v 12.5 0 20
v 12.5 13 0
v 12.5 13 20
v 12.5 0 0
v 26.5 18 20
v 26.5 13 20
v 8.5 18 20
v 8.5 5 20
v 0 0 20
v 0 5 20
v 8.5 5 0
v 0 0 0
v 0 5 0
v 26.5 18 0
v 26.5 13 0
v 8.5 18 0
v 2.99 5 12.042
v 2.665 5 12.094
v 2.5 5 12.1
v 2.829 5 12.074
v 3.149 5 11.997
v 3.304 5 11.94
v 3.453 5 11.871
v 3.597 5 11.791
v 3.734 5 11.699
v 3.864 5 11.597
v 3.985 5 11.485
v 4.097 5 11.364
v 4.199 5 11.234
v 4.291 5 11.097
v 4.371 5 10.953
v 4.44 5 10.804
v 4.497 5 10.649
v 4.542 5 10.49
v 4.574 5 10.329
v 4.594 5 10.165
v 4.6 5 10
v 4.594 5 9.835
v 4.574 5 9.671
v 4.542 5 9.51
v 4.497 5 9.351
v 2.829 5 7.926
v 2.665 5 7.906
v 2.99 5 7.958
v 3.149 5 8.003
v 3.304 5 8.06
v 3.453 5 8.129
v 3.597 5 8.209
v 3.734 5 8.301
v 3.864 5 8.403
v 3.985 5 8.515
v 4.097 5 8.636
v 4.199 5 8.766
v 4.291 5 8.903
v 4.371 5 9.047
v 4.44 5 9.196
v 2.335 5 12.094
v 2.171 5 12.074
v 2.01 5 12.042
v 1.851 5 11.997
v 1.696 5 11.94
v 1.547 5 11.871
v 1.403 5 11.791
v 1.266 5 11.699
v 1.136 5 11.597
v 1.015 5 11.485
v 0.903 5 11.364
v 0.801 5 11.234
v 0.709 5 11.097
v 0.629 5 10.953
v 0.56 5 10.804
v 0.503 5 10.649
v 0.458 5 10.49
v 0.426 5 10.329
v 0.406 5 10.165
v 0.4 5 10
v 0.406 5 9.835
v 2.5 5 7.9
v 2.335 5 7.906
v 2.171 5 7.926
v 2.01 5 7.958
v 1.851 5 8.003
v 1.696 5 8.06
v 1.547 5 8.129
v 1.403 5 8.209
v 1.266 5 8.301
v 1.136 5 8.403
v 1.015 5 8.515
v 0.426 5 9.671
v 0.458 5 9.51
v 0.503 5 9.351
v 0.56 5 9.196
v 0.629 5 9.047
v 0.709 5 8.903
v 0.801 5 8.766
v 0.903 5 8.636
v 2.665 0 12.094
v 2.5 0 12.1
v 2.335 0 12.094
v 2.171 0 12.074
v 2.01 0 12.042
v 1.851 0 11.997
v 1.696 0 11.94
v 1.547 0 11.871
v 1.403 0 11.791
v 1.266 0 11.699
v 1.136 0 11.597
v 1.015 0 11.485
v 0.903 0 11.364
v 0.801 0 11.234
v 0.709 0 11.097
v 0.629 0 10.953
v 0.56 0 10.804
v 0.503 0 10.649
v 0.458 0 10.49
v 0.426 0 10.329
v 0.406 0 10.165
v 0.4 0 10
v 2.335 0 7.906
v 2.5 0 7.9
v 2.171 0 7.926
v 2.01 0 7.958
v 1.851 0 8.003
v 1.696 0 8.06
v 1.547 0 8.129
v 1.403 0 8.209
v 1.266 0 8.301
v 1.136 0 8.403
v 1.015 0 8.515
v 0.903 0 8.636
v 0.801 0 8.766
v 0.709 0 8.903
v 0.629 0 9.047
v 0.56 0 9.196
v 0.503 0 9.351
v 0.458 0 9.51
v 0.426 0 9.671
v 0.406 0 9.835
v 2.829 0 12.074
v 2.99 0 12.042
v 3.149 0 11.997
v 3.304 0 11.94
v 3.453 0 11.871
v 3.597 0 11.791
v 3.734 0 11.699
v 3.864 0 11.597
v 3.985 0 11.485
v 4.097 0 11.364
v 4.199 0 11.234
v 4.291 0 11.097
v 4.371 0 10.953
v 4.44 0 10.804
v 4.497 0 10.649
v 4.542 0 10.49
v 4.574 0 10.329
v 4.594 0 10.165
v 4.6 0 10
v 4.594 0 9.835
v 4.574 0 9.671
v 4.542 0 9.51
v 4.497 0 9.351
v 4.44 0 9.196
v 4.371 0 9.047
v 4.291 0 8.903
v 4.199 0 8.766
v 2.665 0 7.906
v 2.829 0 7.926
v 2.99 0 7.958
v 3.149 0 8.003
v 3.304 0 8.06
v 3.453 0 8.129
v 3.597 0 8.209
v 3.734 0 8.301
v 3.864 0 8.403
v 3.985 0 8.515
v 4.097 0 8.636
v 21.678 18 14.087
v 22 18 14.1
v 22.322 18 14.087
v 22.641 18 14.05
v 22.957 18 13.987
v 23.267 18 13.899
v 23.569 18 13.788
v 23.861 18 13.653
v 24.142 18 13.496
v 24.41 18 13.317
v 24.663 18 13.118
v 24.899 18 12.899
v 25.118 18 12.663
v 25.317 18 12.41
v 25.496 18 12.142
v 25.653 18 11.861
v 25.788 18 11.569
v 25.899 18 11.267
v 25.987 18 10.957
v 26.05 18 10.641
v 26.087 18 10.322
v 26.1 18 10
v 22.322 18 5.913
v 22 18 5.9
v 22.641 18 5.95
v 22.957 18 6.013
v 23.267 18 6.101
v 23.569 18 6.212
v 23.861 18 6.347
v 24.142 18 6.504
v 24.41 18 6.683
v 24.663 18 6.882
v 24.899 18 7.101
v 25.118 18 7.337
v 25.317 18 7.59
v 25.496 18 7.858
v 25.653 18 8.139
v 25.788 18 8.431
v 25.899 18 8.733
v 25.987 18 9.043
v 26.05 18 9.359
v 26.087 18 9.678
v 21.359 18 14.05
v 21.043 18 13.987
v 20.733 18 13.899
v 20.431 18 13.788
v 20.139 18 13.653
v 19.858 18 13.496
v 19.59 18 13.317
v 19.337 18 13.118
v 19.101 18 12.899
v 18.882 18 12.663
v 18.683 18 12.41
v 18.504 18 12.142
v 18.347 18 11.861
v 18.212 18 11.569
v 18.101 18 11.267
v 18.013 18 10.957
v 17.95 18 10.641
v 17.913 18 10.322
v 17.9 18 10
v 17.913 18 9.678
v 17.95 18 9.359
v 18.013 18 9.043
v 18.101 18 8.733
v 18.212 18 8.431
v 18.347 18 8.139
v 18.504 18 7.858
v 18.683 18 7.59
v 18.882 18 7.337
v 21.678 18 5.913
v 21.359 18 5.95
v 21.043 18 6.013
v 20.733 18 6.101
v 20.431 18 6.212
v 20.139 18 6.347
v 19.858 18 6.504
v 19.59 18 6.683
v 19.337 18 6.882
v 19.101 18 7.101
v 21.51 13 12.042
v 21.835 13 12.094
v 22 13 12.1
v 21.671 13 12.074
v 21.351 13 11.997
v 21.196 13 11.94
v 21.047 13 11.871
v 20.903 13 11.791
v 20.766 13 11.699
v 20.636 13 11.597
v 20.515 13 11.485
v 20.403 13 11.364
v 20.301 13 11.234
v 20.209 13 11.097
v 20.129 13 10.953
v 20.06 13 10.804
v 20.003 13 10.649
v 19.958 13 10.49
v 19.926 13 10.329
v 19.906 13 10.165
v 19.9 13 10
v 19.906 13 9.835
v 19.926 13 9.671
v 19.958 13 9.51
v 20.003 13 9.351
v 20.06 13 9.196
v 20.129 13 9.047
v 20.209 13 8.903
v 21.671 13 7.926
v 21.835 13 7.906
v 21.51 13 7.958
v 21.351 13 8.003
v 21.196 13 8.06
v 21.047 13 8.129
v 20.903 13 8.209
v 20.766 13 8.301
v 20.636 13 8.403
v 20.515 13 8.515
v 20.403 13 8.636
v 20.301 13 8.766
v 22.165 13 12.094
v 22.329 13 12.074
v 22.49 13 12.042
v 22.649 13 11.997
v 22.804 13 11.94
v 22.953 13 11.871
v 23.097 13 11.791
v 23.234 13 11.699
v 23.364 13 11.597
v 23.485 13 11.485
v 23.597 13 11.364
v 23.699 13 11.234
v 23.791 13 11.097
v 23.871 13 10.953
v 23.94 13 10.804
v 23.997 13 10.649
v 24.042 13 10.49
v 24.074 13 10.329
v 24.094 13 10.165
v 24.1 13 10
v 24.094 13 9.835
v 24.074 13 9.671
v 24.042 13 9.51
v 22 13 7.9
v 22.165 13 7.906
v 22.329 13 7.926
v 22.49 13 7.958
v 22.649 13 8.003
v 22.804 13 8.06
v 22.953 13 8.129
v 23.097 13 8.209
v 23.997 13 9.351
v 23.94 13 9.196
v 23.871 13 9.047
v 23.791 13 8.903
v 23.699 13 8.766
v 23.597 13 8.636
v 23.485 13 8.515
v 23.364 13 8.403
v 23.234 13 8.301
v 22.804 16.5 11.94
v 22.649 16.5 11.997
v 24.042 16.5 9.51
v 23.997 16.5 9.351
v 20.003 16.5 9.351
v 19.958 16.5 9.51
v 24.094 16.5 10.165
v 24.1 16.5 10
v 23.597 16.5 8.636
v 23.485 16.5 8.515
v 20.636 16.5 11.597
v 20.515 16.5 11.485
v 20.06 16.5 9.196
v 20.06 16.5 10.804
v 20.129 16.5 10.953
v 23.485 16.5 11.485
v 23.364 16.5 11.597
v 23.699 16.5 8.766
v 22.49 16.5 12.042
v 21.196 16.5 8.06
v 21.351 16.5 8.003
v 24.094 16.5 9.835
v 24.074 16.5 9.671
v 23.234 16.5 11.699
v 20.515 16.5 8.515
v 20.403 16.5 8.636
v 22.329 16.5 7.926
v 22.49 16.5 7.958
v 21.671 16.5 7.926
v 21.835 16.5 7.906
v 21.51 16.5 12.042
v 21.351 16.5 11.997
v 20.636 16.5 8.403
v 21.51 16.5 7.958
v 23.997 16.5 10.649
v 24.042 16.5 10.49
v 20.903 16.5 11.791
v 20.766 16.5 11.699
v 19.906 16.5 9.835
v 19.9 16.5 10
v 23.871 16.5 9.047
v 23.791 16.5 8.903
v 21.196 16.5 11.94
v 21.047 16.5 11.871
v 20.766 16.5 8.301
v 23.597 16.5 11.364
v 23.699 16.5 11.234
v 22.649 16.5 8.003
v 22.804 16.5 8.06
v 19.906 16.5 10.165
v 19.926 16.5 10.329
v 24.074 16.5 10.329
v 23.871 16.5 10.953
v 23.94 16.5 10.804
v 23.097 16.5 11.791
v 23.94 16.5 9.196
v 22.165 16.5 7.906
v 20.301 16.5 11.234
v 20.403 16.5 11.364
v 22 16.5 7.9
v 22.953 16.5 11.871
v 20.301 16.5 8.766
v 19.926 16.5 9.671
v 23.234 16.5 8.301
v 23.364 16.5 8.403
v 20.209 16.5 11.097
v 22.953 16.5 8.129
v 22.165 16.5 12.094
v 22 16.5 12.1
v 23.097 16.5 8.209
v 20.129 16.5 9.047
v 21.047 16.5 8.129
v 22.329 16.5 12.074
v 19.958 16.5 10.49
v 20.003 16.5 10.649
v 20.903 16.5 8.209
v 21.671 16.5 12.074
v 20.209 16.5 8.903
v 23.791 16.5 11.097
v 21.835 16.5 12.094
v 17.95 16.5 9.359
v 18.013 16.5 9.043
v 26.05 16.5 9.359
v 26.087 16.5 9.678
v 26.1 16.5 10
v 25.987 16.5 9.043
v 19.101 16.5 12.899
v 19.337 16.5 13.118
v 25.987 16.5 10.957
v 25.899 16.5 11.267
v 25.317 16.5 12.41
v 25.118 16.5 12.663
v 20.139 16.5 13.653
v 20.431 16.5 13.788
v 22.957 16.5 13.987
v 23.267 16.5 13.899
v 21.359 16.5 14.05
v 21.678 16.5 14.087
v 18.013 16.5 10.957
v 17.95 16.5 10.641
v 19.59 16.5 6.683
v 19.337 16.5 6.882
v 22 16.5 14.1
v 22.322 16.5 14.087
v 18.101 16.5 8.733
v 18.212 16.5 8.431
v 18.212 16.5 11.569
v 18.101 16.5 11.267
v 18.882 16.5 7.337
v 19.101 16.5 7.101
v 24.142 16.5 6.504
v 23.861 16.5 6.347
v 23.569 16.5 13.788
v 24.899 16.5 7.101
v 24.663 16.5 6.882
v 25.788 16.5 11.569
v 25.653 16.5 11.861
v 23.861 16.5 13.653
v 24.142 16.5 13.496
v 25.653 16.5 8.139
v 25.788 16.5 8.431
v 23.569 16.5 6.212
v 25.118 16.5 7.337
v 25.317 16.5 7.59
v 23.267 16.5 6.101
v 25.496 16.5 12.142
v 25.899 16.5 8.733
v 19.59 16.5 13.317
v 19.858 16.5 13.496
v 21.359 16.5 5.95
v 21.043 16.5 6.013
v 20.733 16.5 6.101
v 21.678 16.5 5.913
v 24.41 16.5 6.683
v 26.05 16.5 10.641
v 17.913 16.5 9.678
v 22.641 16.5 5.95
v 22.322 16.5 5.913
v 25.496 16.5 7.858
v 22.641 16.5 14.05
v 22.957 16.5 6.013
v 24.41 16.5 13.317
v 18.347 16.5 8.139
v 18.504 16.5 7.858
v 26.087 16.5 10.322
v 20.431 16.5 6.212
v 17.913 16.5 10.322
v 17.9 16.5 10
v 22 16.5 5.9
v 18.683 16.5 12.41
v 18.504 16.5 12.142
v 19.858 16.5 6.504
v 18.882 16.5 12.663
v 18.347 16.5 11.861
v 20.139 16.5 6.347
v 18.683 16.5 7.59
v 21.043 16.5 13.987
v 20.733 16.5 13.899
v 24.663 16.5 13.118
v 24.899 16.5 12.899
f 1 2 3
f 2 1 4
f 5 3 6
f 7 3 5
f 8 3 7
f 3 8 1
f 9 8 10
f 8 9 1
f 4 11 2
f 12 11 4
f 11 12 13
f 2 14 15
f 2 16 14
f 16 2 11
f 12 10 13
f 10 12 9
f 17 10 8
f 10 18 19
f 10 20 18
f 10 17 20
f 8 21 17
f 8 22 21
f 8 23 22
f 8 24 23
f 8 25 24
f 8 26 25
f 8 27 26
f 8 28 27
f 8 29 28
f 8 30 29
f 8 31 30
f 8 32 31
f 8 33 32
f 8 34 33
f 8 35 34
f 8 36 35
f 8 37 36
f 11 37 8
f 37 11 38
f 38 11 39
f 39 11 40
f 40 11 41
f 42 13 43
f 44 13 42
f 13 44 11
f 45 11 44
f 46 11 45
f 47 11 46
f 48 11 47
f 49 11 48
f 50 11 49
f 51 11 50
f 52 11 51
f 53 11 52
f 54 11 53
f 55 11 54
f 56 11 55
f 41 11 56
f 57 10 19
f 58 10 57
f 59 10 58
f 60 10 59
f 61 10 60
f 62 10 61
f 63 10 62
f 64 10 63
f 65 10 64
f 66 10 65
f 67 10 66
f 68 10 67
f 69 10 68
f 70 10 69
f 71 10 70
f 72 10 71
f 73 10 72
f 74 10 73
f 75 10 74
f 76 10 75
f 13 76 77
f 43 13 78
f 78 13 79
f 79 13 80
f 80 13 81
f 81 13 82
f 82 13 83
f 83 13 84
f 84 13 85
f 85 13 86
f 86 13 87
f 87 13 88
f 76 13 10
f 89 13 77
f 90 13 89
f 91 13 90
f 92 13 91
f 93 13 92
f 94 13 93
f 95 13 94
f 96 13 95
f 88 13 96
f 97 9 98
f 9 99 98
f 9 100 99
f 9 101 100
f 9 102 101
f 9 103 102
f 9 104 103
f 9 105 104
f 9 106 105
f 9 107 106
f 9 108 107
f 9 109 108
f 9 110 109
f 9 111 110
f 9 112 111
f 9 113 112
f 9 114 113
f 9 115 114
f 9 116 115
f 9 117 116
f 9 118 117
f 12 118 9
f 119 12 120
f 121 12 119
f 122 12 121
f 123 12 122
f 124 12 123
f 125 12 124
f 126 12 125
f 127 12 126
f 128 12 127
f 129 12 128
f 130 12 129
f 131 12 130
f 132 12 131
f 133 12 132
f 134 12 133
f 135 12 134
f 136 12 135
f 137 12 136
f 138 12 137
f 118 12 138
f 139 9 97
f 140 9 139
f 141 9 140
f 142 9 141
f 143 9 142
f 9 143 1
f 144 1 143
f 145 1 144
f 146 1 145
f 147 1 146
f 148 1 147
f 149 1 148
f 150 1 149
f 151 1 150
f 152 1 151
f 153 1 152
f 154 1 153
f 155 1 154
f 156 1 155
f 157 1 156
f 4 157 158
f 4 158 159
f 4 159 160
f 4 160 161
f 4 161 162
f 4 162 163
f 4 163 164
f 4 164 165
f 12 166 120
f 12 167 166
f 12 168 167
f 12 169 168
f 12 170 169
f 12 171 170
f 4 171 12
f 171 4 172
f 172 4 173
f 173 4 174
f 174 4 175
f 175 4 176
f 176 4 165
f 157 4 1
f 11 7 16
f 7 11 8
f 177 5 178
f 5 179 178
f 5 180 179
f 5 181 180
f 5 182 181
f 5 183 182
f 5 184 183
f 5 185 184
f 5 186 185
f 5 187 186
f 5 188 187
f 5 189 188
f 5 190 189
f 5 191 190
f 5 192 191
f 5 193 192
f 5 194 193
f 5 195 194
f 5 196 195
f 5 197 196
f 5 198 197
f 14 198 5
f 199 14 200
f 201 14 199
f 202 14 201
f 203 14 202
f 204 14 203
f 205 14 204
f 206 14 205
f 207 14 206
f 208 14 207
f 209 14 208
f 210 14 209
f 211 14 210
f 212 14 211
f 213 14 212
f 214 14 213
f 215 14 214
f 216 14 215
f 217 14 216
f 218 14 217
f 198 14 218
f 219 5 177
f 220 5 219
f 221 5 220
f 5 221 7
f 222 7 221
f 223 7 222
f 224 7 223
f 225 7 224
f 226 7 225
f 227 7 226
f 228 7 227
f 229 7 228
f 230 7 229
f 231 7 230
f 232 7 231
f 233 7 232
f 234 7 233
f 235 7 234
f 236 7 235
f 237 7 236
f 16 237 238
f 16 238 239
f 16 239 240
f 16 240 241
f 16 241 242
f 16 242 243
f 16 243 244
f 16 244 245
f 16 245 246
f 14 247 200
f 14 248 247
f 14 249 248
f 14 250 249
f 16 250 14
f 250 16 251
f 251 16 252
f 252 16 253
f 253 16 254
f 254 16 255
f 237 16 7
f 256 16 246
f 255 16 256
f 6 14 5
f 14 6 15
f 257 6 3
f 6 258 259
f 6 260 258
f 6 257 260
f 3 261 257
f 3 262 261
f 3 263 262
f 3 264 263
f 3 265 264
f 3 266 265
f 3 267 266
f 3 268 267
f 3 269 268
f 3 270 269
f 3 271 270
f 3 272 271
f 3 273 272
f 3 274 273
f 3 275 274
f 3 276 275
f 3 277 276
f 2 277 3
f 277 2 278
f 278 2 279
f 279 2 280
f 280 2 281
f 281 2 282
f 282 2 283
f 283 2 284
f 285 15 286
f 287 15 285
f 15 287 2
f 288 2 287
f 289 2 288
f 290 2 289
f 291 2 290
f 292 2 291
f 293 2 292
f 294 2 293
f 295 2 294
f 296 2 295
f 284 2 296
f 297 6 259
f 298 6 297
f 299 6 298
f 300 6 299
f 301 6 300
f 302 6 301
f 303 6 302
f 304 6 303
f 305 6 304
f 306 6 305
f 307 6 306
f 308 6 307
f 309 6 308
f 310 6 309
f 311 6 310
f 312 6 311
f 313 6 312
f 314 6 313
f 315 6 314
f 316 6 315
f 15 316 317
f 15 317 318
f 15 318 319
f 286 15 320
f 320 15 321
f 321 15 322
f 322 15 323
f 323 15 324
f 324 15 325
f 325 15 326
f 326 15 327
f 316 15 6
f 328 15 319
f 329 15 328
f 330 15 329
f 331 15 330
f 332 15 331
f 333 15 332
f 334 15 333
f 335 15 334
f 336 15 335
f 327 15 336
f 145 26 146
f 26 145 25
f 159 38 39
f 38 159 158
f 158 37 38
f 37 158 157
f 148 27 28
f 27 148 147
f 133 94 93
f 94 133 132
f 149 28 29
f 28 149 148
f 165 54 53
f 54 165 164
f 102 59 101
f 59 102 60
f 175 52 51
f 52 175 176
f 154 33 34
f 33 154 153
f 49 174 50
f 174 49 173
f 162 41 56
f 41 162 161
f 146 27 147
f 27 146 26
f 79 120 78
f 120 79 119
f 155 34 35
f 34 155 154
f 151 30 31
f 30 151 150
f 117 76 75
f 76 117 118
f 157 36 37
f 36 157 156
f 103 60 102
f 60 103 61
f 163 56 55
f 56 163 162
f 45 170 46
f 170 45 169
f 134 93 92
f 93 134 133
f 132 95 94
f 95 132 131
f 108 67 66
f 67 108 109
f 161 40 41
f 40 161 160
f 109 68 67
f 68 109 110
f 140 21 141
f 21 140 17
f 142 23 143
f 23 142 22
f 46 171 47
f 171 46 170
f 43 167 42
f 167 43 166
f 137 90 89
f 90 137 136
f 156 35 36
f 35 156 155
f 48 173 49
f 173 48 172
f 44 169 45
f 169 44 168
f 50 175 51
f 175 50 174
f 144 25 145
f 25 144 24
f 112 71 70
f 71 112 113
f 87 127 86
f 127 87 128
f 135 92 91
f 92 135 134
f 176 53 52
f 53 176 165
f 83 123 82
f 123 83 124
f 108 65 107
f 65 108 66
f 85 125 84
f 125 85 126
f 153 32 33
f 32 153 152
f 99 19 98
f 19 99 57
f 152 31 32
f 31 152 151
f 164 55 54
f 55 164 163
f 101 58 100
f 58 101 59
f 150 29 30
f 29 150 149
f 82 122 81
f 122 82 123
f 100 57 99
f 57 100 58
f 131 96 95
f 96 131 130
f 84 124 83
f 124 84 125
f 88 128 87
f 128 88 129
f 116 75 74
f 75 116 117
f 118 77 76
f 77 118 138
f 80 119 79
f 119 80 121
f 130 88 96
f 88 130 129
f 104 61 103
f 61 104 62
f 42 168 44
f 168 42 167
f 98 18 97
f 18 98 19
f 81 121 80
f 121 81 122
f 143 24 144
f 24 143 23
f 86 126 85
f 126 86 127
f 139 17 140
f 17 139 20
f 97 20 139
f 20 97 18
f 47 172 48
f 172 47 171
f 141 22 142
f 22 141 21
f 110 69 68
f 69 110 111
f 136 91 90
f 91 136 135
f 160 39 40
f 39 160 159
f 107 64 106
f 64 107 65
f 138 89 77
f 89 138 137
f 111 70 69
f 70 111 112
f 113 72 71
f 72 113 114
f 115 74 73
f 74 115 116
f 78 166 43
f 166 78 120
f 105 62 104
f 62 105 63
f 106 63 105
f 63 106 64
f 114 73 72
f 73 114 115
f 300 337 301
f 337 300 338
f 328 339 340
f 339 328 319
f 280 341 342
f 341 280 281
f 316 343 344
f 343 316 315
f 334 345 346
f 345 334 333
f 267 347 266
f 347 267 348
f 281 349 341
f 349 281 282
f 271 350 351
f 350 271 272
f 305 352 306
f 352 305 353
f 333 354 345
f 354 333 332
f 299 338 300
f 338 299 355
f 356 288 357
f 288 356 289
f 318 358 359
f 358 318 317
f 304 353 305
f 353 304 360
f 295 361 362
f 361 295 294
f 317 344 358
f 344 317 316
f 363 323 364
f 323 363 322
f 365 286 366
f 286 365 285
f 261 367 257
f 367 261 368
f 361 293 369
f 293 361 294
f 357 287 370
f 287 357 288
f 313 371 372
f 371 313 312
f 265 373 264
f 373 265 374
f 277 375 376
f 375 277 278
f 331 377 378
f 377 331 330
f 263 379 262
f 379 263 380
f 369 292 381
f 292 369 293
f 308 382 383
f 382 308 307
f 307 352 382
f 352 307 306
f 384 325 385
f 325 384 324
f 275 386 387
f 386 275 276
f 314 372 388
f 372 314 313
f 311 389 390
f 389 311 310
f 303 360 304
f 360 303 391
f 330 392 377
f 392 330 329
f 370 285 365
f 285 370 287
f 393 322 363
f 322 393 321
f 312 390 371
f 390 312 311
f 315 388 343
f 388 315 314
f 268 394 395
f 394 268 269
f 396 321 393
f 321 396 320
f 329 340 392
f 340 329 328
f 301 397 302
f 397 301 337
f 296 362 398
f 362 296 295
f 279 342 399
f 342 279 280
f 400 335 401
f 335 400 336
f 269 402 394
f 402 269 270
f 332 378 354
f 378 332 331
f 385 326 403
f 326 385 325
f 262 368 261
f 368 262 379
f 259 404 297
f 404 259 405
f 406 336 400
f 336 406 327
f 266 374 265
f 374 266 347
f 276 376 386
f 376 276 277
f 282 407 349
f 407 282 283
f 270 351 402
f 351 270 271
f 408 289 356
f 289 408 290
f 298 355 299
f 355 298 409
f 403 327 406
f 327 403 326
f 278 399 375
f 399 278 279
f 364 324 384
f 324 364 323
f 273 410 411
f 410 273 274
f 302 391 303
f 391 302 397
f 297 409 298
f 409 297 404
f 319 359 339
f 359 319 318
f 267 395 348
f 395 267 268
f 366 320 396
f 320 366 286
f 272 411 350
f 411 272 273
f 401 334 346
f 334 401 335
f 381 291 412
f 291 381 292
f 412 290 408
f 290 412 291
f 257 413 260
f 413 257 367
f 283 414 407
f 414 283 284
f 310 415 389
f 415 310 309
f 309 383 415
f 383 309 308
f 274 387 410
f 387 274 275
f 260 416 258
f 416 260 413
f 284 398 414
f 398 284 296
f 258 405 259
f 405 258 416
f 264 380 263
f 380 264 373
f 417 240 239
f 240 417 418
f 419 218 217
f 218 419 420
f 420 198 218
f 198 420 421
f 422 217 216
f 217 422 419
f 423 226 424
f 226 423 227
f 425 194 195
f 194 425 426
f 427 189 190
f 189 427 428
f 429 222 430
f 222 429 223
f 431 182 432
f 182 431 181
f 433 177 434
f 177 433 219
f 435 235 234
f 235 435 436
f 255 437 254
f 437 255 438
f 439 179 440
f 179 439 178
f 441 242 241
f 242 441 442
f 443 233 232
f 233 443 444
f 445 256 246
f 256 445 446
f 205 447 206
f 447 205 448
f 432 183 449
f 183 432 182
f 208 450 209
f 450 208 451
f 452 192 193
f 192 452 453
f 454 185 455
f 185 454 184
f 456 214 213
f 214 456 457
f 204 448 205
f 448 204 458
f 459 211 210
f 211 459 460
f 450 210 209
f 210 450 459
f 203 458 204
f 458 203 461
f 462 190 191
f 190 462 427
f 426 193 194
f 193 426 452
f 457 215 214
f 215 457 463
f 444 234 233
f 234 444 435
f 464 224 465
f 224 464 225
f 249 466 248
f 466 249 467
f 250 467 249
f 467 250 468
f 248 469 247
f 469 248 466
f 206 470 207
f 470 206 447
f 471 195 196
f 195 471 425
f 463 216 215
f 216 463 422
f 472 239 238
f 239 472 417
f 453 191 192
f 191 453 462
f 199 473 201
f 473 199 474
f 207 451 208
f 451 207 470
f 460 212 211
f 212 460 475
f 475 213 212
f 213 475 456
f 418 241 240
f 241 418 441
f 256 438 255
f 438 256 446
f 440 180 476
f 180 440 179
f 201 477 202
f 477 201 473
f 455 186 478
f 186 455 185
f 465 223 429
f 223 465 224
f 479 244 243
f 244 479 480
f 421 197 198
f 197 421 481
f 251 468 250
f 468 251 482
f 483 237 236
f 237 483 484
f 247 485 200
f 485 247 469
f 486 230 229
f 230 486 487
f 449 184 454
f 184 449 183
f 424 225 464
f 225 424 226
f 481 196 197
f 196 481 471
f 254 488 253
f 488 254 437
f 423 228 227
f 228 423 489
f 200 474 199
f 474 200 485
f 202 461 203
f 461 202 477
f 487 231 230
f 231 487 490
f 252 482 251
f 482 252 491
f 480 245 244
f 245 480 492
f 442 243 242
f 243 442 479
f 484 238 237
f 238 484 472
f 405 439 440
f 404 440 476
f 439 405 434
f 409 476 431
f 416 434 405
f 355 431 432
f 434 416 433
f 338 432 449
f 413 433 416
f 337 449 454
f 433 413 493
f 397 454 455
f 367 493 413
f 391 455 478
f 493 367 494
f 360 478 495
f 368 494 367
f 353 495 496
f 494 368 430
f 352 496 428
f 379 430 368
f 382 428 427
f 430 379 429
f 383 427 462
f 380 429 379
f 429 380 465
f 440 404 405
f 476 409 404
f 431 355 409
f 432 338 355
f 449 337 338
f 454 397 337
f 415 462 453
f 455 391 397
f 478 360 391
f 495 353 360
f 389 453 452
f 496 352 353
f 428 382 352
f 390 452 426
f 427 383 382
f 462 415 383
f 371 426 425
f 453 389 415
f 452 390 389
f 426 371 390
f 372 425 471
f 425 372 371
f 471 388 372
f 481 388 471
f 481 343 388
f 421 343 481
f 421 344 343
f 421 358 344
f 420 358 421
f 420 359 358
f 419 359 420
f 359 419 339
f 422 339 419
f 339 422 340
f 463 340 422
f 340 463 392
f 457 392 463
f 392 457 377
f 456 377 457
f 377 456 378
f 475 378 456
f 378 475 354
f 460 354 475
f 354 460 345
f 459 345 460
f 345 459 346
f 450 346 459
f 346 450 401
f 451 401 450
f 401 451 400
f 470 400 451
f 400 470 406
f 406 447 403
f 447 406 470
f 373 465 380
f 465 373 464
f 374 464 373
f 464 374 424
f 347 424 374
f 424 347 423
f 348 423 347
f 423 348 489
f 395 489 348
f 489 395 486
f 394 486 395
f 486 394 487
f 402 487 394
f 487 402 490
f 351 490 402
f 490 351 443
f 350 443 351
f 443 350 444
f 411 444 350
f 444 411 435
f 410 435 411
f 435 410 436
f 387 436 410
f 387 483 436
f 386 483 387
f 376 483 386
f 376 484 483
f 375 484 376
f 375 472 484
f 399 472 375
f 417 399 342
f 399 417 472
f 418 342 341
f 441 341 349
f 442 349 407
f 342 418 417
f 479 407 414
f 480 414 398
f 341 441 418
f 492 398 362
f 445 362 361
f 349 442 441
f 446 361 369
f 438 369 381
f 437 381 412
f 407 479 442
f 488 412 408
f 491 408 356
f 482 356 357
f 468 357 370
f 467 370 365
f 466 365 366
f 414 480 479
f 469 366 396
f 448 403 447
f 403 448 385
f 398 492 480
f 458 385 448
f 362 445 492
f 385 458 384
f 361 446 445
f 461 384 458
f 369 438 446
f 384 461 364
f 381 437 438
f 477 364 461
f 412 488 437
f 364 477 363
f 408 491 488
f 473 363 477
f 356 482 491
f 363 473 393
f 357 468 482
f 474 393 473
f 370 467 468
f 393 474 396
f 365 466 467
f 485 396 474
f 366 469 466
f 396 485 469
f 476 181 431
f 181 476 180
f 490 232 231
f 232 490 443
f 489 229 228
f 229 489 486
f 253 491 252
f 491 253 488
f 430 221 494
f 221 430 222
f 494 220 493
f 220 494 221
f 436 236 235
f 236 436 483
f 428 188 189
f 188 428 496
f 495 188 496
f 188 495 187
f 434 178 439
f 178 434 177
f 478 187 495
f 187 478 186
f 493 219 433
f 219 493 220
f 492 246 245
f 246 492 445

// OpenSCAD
$fn=80;

difference() {
    union() {
        cube([12.5, 5, 20]);
        translate([12.5-4, 0, 0]) cube([4, 18, 20]);
        translate([12.5, 18-5, 0]) cube([14, 5, 20]);
    }
    translate([12.5-10, -1, 10]) rotate([-90, 0, 0]) cylinder(d=4.2, h=10);
    translate([22, 10, 10]) rotate([-90, 0, 0]) cylinder(d=4.2, h=10);
    translate([22, 16.5, 10]) rotate([-90, 0, 0]) cylinder(d=8.2, h=10);
}
